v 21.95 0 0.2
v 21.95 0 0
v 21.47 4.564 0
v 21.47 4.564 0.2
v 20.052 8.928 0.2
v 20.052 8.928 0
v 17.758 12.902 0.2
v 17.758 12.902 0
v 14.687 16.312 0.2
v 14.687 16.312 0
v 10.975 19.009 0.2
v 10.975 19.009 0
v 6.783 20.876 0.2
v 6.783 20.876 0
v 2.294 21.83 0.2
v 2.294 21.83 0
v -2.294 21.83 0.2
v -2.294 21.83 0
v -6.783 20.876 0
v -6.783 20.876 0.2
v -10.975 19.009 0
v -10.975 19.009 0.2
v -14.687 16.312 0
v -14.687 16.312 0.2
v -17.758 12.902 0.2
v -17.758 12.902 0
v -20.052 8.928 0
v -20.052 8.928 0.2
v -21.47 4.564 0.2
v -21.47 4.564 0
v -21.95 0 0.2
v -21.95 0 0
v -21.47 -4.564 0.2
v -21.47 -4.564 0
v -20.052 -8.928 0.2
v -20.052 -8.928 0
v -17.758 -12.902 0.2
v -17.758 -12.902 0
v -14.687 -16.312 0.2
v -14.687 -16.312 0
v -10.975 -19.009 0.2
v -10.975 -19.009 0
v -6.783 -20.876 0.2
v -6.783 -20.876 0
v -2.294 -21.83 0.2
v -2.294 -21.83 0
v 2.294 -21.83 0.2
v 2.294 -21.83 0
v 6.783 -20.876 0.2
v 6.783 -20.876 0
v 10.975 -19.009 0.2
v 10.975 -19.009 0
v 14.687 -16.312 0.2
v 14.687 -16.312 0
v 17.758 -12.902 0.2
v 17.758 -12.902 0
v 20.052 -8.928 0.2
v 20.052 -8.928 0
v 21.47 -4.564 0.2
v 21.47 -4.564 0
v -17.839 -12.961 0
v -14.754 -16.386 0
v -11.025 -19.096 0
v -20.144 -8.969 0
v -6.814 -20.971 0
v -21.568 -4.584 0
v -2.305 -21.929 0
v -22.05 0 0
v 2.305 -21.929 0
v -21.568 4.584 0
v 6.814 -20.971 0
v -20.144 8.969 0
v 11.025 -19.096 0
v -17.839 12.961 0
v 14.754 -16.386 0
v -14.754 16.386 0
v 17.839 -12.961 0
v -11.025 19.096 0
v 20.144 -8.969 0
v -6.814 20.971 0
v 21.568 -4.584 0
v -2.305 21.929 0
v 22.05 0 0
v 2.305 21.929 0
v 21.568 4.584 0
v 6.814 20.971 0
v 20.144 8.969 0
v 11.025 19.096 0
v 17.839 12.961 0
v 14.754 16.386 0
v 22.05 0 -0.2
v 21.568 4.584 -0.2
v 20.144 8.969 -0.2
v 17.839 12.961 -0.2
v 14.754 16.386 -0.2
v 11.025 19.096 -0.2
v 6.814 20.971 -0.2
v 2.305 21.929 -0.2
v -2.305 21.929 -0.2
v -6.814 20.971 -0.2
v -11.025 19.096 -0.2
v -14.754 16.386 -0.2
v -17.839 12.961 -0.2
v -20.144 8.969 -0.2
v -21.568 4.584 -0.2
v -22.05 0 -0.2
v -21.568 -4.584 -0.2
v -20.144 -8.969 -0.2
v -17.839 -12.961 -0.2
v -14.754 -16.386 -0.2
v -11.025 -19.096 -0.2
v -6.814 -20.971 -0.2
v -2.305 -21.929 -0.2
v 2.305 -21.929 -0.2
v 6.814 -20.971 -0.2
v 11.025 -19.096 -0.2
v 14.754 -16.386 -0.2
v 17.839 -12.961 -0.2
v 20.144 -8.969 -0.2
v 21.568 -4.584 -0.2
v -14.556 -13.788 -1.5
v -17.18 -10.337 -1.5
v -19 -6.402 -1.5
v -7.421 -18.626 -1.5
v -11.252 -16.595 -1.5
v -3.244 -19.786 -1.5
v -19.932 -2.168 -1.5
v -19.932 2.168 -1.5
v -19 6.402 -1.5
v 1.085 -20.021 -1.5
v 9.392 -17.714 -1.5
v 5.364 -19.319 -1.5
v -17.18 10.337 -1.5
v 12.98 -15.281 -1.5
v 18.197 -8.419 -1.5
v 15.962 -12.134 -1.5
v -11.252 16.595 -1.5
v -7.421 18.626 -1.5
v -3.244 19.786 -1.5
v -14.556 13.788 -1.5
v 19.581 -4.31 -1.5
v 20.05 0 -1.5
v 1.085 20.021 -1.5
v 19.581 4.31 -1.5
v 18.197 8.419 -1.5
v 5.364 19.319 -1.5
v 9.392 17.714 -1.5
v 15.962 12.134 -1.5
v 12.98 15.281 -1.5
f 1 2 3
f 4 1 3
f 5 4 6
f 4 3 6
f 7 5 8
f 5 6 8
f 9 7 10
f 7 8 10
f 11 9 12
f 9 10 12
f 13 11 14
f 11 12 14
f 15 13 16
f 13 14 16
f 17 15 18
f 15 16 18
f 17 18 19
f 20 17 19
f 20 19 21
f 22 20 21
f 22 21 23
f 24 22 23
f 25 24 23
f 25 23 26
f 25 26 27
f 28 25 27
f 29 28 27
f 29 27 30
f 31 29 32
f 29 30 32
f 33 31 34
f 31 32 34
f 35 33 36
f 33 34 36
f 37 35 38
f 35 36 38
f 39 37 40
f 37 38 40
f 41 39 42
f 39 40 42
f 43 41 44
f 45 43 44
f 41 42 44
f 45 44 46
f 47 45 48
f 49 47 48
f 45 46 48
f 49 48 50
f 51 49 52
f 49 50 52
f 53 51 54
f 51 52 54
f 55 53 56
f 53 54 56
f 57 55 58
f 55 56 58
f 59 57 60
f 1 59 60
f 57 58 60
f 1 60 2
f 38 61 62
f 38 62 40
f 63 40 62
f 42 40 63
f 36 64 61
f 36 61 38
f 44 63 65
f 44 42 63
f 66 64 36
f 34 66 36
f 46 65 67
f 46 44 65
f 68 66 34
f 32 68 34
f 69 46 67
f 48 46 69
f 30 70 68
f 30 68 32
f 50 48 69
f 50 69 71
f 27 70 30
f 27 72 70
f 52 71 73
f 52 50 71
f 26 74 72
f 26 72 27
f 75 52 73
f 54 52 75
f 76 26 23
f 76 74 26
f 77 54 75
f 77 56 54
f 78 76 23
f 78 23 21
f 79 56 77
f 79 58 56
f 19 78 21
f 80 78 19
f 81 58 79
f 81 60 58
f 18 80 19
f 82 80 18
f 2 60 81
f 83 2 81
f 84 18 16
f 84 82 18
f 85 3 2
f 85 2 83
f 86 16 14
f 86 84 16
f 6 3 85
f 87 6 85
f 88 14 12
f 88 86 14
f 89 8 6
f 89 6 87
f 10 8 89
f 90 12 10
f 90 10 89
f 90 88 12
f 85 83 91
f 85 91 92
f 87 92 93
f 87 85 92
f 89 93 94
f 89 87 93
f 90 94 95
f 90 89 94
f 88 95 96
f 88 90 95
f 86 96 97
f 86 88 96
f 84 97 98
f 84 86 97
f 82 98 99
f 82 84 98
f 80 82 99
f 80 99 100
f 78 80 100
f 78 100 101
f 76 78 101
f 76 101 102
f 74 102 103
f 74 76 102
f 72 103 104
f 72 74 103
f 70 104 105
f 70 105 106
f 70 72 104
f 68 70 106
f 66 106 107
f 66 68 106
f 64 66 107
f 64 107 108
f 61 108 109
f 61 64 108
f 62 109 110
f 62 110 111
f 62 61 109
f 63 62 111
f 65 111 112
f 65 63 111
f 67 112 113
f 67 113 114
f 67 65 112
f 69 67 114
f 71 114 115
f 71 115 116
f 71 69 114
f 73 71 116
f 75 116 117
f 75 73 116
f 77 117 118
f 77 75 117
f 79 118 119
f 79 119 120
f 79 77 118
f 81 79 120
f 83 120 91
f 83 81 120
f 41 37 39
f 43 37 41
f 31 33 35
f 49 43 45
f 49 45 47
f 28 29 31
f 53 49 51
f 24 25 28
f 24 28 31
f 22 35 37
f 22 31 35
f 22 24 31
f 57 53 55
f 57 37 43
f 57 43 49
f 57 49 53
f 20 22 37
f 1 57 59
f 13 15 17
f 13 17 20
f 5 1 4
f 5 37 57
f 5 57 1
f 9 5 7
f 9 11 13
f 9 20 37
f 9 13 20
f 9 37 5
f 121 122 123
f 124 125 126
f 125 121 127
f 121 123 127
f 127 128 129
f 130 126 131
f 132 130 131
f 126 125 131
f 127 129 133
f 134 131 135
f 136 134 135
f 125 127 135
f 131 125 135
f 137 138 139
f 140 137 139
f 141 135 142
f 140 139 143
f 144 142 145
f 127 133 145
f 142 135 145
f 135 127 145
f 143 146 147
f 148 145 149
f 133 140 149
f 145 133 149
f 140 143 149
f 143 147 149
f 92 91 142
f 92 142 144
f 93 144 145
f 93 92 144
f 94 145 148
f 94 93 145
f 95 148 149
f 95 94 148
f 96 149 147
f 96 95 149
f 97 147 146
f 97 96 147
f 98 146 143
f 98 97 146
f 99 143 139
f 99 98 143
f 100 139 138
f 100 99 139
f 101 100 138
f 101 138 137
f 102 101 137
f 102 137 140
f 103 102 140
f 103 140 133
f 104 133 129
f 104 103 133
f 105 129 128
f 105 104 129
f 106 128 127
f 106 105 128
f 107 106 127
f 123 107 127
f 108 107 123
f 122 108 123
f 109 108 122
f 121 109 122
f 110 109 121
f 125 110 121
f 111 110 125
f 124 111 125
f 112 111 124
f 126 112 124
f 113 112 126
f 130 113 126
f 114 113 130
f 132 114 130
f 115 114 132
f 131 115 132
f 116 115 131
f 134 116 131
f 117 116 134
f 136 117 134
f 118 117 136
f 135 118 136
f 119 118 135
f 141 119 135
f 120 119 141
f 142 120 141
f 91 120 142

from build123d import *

# Parameters (mm, degrees)
F0_R     = 22.05
F1_DEPTH = 1.5
F2_SIZE2 = 1.3
F2_SIZE  = 2
F3_R     = 21.95
F4_DEPTH = 0.2


with BuildPart() as f1:
    # F0 (on Top) → F1 (new body)
    with BuildSketch(Plane.XY):
        Circle(F0_R)
    extrude(amount=-F1_DEPTH)

    # F2
    f2_edges = [f1.edges().sort_by_distance(p)[0] for p in [
        (-22.05, 0, -1.5),
    ]]
    f2_side = f1.faces().sort_by_distance((0, 0, -1.5))[0]
    chamfer(f2_edges, length=F2_SIZE, length2=F2_SIZE2, reference=f2_side)

    # F3 (on face) → F4 (join)
    with BuildSketch(Plane.XY):
        Circle(F3_R)
    extrude(amount=F4_DEPTH)


solid = f1.part
